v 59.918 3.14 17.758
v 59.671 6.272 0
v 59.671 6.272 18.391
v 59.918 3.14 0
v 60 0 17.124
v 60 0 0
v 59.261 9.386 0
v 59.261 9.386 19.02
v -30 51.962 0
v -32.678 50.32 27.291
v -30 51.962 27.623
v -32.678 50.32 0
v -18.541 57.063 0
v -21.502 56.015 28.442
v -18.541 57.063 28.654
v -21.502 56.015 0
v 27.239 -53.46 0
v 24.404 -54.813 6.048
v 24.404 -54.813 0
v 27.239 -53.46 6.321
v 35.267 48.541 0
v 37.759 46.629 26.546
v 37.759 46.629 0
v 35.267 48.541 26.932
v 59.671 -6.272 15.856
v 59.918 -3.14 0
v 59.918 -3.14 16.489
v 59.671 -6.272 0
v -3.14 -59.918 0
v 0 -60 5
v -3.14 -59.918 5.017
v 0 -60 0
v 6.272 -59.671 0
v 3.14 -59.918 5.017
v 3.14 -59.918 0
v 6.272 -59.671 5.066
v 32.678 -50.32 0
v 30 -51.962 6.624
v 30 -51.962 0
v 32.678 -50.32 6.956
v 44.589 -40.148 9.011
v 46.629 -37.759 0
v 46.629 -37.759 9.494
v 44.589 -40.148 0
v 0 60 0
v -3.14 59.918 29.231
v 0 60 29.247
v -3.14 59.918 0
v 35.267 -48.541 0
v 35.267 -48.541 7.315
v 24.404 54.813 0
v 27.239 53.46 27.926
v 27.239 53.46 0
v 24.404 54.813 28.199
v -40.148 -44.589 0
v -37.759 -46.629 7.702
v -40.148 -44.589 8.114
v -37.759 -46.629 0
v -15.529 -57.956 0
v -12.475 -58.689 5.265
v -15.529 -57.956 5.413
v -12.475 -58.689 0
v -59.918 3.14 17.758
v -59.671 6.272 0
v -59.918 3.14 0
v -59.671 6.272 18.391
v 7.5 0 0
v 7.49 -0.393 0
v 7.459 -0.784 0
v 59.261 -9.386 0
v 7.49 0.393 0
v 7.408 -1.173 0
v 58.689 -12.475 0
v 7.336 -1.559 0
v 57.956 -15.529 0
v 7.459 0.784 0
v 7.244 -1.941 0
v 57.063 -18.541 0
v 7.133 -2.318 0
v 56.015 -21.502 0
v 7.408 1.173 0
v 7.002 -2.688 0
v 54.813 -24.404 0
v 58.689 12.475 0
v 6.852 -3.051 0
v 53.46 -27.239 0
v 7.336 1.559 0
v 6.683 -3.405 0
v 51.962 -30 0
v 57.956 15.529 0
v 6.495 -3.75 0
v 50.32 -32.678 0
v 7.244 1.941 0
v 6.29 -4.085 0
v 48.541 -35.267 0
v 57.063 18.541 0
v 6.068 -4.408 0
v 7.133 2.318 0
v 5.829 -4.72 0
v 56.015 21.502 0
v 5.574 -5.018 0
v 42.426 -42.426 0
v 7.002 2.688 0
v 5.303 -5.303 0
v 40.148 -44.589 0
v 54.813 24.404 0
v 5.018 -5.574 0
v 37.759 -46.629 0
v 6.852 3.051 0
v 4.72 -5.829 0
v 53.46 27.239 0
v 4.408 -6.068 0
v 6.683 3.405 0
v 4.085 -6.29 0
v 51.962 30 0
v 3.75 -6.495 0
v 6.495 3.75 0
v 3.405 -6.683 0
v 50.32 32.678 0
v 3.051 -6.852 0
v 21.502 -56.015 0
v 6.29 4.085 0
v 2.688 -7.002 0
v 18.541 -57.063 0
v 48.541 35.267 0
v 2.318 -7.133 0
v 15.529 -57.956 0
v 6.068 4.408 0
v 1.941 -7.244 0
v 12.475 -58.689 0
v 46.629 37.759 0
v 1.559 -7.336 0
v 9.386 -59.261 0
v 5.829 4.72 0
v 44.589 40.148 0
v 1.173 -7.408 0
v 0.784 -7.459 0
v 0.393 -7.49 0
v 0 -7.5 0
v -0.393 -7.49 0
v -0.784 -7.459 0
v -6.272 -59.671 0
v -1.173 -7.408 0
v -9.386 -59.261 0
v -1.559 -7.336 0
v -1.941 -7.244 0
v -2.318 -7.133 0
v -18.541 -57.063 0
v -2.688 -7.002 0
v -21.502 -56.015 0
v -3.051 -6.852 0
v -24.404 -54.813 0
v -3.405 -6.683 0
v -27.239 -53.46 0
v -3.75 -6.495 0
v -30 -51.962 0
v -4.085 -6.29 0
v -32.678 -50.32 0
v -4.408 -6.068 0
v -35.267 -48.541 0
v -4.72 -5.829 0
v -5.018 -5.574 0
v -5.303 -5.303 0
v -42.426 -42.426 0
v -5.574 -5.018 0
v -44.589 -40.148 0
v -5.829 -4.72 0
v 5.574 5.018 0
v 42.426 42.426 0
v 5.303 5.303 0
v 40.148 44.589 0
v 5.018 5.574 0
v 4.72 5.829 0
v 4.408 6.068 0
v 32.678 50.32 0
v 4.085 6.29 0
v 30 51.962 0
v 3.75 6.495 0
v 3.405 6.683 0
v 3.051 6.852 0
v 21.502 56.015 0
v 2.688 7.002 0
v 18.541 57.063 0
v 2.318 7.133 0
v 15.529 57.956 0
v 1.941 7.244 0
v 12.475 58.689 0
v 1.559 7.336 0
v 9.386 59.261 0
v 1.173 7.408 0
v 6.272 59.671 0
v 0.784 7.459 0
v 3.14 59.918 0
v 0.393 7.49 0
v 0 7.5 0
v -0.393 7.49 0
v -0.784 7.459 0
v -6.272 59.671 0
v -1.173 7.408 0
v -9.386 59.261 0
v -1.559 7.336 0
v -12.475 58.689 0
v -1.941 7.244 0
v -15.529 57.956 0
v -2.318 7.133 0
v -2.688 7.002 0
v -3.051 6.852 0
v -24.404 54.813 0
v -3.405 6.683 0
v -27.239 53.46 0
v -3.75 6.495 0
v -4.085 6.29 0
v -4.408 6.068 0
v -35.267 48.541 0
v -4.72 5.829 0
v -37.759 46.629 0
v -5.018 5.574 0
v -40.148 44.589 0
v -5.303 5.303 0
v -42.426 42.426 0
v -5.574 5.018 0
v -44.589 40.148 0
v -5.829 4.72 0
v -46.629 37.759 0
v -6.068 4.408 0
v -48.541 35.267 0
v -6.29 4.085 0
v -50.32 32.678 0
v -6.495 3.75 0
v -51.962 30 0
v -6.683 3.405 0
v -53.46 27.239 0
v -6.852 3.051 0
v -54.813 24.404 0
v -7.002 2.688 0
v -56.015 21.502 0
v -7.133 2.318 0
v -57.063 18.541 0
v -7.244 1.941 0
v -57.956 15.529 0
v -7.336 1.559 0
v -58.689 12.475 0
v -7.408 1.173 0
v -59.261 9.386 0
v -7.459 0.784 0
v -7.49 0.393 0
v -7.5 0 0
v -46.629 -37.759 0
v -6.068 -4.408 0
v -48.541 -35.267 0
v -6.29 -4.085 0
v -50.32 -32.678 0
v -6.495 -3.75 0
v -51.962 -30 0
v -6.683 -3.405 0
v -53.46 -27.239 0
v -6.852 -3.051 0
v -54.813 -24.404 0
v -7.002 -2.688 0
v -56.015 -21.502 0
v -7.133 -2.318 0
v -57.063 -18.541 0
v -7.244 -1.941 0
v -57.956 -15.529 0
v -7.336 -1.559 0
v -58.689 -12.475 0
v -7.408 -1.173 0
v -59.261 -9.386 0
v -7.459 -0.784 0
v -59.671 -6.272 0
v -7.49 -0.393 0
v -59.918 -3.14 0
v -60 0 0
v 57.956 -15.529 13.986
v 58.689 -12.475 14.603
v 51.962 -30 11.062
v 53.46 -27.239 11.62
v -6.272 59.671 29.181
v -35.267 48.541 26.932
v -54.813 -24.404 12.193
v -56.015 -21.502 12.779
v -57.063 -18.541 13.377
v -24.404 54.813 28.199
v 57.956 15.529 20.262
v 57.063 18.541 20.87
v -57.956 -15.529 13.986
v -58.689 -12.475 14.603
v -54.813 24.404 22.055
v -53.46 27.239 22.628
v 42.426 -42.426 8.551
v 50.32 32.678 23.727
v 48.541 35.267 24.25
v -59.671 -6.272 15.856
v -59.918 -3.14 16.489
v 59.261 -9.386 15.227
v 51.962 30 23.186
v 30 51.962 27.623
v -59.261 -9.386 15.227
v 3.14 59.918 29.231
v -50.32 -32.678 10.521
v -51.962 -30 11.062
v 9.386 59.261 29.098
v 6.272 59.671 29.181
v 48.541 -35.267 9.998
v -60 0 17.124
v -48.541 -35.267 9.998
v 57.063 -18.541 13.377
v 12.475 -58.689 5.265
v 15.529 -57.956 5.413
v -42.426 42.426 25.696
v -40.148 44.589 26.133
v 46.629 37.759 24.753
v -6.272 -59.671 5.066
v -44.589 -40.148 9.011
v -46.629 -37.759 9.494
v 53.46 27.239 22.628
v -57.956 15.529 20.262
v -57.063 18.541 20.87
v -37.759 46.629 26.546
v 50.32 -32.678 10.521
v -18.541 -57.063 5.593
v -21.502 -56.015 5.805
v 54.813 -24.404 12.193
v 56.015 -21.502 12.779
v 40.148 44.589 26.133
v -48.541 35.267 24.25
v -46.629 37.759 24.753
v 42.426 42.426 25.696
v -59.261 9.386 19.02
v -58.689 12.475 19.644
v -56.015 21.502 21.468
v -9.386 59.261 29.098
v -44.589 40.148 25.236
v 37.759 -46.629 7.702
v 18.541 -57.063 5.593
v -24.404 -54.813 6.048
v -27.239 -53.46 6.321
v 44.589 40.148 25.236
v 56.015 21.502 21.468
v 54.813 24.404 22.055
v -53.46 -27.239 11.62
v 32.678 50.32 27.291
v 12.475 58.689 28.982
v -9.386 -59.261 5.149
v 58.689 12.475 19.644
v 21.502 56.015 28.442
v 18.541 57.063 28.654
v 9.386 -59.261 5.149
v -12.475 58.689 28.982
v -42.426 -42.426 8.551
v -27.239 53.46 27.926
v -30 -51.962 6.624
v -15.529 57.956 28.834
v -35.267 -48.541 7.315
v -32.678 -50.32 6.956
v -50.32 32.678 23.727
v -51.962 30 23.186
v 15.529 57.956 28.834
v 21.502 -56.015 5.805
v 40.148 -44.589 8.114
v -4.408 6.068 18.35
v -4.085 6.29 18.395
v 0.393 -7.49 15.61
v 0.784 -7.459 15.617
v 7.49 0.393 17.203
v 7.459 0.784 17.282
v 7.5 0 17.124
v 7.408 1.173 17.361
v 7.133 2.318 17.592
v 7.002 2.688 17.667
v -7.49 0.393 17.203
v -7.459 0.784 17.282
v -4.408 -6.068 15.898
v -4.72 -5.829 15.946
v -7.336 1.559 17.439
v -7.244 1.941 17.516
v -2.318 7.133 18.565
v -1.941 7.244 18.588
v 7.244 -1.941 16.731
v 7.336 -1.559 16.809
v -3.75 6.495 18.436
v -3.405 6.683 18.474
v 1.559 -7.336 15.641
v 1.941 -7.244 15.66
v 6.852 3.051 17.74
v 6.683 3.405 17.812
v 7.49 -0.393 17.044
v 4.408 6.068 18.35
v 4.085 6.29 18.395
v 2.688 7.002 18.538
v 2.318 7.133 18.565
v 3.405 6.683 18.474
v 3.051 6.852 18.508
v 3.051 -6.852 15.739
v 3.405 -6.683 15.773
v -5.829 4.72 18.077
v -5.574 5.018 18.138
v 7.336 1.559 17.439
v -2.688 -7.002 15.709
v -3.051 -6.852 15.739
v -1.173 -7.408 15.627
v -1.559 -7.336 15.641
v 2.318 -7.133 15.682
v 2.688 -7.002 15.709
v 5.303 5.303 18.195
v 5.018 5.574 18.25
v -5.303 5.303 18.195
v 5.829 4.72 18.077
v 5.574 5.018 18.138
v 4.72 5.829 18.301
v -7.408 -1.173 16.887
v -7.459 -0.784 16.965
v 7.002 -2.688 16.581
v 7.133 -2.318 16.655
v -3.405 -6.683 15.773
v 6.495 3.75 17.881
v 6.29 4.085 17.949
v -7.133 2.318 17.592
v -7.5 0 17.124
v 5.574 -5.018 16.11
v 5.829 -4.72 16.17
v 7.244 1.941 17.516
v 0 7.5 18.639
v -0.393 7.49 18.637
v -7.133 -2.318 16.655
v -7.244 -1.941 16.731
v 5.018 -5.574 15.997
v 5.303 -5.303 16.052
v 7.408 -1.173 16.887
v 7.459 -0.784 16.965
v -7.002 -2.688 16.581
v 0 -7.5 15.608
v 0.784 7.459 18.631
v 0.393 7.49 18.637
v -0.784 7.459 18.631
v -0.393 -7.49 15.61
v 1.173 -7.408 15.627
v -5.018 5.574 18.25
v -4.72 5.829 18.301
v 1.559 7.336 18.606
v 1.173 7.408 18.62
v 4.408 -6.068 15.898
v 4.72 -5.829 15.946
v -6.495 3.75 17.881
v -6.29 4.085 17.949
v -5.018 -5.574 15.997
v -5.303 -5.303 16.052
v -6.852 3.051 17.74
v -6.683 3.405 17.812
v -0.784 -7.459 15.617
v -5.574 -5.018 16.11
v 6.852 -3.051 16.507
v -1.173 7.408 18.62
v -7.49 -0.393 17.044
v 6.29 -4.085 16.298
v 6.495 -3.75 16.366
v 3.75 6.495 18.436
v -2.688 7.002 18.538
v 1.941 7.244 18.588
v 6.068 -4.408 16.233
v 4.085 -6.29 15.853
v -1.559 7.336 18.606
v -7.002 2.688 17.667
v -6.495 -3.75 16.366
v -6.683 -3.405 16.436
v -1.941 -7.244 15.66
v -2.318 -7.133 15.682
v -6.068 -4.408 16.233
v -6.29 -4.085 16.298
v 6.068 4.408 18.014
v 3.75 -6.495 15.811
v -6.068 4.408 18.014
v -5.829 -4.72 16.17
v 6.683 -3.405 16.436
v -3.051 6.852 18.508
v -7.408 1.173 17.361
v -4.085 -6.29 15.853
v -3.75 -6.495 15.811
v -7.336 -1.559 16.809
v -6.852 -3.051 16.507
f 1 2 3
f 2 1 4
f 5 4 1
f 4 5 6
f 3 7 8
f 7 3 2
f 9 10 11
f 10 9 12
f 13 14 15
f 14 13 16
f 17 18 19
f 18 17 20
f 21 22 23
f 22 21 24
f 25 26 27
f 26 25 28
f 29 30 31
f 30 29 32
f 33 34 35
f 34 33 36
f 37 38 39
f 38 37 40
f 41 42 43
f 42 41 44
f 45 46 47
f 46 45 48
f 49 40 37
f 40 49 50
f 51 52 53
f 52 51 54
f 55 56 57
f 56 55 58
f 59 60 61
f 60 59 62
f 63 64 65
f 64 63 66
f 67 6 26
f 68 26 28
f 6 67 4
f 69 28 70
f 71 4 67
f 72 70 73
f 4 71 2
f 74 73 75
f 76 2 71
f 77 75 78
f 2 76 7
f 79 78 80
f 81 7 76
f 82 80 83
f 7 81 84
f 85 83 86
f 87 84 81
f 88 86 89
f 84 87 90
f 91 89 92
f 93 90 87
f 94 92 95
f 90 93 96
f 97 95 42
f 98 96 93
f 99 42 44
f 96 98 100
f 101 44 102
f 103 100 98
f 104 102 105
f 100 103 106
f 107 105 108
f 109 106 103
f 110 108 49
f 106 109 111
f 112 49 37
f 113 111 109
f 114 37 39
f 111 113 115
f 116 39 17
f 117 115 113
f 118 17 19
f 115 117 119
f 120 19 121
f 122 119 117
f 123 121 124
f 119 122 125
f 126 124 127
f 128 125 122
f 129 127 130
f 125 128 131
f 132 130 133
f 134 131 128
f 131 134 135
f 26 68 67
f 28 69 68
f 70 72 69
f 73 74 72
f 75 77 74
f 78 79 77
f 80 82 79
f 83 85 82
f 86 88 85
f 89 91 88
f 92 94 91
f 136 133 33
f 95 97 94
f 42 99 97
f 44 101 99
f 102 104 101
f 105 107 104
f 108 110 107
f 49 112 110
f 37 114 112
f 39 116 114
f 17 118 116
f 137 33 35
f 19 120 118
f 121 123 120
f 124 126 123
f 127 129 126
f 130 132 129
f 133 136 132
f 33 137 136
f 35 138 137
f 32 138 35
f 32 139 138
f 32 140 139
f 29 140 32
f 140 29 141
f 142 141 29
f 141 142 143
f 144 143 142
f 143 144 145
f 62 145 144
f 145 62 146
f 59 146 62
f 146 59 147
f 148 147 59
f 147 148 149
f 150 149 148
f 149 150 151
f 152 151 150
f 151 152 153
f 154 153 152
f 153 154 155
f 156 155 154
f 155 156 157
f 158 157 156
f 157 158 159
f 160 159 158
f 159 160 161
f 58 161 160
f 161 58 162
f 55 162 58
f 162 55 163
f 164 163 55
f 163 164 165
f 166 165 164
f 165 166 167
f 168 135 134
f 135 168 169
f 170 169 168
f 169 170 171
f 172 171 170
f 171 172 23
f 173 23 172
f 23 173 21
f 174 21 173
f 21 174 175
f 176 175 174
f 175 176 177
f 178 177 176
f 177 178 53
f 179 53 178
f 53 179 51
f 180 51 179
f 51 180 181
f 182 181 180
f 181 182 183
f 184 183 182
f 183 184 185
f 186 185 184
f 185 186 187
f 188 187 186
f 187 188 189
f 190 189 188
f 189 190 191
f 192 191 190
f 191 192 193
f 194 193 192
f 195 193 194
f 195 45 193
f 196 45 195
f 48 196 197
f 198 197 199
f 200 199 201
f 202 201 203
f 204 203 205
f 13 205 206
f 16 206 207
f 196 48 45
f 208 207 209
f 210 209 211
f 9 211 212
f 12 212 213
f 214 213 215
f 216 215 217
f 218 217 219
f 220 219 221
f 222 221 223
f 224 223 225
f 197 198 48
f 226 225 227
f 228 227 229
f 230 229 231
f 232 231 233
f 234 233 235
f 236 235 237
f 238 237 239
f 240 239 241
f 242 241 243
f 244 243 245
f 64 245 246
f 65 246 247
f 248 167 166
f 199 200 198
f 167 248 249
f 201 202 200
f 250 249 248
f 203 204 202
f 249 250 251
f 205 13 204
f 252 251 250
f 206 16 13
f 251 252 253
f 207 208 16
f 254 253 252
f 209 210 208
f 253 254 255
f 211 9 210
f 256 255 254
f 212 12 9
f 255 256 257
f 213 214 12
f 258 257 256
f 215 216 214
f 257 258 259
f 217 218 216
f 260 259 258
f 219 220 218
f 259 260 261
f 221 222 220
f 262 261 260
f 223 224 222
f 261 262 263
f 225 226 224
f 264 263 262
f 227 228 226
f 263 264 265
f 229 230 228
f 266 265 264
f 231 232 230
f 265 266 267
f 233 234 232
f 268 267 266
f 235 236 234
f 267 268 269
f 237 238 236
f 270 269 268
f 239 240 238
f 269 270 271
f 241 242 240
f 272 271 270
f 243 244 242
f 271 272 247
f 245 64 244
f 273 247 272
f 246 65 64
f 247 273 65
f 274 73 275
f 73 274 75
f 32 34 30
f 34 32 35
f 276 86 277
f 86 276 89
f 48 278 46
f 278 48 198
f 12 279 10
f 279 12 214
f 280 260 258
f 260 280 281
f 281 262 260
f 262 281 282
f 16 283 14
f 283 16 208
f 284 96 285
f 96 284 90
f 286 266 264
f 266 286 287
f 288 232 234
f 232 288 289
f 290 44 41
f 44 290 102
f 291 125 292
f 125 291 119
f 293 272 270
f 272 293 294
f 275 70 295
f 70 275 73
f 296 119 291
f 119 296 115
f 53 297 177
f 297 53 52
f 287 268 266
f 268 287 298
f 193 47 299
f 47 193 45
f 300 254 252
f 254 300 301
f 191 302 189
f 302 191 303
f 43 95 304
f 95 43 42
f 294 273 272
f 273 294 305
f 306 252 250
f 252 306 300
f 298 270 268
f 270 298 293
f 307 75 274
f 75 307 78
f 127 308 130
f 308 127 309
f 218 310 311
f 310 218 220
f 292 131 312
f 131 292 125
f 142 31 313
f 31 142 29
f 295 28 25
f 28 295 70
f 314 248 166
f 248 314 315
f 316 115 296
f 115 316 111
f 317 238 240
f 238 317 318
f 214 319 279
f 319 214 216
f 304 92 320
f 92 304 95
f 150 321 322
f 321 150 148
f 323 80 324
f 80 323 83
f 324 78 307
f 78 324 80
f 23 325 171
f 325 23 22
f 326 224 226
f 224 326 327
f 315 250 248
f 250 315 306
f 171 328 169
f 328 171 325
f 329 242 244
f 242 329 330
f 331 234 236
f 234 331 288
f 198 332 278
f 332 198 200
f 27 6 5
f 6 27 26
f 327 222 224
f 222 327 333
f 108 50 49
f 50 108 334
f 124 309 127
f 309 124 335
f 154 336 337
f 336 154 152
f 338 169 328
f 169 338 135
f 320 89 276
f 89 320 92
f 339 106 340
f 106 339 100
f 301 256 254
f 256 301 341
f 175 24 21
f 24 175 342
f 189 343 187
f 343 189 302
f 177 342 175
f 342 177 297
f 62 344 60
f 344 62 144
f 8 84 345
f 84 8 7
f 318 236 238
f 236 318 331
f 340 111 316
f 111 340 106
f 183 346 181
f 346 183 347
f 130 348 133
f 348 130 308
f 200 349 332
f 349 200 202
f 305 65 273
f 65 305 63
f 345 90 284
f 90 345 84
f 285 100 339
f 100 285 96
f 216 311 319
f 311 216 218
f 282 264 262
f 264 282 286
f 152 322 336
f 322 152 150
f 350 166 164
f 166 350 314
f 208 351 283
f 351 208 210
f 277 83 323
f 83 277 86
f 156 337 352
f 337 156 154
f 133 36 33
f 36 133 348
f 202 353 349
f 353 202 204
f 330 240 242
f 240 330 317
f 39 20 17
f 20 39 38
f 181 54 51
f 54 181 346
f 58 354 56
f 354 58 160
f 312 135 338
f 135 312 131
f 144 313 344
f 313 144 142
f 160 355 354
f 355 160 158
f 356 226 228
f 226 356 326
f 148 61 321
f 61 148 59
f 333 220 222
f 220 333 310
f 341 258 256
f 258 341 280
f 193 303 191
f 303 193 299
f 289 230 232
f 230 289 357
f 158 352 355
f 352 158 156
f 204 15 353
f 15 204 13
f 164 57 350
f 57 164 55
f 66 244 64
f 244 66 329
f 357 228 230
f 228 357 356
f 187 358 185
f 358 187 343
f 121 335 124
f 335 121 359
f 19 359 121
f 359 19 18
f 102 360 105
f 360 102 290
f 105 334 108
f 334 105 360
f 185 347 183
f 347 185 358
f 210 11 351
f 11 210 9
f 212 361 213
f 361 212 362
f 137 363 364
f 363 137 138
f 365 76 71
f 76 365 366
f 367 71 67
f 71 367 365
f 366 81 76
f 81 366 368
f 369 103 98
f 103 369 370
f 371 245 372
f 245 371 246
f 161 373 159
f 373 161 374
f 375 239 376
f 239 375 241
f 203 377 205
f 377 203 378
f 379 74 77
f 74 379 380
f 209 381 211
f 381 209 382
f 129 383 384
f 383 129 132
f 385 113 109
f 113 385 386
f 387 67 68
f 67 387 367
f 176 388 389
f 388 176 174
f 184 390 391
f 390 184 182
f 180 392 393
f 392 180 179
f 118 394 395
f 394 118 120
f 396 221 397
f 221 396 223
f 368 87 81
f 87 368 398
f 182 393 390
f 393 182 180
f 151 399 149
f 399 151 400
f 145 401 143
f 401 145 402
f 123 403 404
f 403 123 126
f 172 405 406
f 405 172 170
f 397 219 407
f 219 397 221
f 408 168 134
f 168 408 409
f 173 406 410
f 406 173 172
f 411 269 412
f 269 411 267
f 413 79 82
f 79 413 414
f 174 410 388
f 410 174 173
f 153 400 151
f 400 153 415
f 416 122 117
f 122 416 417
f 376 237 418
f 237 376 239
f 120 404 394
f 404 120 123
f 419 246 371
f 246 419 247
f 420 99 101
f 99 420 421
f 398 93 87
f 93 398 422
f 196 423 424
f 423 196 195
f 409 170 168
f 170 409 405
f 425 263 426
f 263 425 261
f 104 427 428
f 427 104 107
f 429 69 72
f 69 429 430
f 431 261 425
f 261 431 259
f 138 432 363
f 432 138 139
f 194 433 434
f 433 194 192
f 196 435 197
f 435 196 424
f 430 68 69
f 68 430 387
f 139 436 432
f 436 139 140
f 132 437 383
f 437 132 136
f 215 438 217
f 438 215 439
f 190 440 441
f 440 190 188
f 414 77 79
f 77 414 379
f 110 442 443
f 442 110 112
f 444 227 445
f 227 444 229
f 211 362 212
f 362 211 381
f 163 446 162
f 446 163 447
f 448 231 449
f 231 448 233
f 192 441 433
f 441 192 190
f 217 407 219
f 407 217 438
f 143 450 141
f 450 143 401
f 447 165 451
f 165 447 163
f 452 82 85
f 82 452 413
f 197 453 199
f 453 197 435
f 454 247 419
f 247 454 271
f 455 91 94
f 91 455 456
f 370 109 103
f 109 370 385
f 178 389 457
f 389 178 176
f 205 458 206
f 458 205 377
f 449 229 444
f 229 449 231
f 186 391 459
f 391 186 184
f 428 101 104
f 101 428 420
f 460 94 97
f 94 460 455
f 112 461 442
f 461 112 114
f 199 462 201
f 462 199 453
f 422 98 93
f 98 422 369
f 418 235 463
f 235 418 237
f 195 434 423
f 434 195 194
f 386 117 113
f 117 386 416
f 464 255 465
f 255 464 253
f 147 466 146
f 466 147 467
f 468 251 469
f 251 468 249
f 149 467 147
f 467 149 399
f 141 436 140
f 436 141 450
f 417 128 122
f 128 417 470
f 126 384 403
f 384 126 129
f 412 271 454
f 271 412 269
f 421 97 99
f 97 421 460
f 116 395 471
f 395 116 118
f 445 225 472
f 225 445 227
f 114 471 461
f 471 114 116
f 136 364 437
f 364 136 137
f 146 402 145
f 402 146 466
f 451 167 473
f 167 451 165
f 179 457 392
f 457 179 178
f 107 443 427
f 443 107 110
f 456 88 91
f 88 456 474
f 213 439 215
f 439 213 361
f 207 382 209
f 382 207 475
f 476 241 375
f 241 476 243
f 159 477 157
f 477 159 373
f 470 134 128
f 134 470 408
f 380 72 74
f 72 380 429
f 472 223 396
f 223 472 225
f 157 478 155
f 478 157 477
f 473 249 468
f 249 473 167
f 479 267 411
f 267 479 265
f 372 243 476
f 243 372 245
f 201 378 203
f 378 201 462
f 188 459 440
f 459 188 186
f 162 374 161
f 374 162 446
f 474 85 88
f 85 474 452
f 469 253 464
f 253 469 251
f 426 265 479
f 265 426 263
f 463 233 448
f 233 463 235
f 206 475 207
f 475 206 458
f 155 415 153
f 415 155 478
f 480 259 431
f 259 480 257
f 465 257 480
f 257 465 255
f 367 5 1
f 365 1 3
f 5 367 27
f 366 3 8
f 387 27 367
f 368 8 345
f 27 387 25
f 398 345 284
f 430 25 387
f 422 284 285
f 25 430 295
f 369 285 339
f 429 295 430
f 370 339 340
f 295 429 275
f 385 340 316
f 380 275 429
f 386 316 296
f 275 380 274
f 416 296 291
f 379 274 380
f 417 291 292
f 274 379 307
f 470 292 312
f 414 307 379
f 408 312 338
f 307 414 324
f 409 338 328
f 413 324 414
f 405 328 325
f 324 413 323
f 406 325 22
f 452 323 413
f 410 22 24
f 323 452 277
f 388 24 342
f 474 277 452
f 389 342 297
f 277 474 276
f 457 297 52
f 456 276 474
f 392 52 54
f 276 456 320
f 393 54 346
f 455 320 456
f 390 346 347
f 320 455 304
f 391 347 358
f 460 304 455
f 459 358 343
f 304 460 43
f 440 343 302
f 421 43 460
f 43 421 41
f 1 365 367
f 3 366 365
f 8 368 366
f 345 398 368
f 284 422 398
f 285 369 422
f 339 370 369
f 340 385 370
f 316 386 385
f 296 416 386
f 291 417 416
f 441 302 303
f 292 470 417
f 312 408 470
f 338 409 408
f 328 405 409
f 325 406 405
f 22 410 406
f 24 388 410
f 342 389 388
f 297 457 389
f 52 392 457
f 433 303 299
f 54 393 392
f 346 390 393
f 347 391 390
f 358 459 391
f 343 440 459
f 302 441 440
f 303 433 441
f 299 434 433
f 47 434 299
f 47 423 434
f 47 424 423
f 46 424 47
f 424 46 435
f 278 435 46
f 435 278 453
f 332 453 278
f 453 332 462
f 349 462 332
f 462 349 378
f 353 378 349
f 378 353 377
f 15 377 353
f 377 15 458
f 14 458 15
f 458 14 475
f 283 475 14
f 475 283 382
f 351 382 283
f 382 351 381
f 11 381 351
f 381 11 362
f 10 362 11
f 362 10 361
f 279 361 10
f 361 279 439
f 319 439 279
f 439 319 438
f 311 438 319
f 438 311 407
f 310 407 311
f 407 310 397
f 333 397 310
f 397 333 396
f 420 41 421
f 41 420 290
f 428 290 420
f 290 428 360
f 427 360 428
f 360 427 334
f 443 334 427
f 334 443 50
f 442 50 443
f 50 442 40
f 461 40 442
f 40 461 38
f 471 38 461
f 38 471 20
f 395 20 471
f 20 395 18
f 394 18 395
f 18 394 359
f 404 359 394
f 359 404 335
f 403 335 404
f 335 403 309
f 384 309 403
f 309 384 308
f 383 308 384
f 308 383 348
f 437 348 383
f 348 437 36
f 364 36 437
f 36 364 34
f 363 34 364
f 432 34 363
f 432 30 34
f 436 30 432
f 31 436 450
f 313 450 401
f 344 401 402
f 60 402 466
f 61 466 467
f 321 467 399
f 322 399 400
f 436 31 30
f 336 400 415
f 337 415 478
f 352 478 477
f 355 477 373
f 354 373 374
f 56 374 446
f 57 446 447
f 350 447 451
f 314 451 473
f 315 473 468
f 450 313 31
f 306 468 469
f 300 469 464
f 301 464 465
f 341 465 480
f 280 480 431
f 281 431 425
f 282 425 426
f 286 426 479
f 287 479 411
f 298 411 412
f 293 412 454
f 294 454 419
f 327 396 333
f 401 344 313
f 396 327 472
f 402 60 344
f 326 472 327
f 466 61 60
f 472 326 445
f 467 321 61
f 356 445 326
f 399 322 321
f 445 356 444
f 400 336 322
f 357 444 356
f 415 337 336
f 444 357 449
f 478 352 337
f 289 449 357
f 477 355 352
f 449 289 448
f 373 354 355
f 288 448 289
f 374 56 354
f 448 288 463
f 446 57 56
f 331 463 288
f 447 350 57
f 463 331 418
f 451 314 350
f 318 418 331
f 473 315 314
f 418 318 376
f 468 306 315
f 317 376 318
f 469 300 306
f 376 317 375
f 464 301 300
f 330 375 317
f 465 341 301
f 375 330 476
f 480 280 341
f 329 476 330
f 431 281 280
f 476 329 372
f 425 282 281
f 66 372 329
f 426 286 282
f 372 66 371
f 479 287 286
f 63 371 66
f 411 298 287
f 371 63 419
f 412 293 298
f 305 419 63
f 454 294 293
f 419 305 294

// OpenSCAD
//**************************************************************************
//*   
//*   Configurable CD/DVD Doorstop
//*   dimensions (all in mm)
//*   Created by Keith Welker
//*   10 April 2016
//**************************************************************************

FN = 120;//$fn for cylinders (resolution)
ID = 15; //CD inner diameter - 15 recommended
OD = 120; // CD outer diameter - 120 recommended
Hmin = 5; // minimum height of doorstop
Hmax = 30; // maximum height of doorstop
 
CD_DoorStop();

module CD_DoorStop()
{
    delta = .015; // small delta size for cutouts
    os = Hmin + (Hmax-Hmin)/2;
    difference()
    {
        cylinder(Hmax, d=OD, $fn = FN);
        //remove the inner hole
        translate([0,0,-delta])
        cylinder(Hmax+2*delta, d=ID, $fn = FN);
        //remove the top to form a wedge...
        translate([-OD*1.25/2, -OD/2, Hmin])
        rotate(a = asin((Hmax-Hmin)/OD)*.95, v=[1,0,0])
        cube([OD*1.25, OD*1.25, Hmax]);
    }
}


